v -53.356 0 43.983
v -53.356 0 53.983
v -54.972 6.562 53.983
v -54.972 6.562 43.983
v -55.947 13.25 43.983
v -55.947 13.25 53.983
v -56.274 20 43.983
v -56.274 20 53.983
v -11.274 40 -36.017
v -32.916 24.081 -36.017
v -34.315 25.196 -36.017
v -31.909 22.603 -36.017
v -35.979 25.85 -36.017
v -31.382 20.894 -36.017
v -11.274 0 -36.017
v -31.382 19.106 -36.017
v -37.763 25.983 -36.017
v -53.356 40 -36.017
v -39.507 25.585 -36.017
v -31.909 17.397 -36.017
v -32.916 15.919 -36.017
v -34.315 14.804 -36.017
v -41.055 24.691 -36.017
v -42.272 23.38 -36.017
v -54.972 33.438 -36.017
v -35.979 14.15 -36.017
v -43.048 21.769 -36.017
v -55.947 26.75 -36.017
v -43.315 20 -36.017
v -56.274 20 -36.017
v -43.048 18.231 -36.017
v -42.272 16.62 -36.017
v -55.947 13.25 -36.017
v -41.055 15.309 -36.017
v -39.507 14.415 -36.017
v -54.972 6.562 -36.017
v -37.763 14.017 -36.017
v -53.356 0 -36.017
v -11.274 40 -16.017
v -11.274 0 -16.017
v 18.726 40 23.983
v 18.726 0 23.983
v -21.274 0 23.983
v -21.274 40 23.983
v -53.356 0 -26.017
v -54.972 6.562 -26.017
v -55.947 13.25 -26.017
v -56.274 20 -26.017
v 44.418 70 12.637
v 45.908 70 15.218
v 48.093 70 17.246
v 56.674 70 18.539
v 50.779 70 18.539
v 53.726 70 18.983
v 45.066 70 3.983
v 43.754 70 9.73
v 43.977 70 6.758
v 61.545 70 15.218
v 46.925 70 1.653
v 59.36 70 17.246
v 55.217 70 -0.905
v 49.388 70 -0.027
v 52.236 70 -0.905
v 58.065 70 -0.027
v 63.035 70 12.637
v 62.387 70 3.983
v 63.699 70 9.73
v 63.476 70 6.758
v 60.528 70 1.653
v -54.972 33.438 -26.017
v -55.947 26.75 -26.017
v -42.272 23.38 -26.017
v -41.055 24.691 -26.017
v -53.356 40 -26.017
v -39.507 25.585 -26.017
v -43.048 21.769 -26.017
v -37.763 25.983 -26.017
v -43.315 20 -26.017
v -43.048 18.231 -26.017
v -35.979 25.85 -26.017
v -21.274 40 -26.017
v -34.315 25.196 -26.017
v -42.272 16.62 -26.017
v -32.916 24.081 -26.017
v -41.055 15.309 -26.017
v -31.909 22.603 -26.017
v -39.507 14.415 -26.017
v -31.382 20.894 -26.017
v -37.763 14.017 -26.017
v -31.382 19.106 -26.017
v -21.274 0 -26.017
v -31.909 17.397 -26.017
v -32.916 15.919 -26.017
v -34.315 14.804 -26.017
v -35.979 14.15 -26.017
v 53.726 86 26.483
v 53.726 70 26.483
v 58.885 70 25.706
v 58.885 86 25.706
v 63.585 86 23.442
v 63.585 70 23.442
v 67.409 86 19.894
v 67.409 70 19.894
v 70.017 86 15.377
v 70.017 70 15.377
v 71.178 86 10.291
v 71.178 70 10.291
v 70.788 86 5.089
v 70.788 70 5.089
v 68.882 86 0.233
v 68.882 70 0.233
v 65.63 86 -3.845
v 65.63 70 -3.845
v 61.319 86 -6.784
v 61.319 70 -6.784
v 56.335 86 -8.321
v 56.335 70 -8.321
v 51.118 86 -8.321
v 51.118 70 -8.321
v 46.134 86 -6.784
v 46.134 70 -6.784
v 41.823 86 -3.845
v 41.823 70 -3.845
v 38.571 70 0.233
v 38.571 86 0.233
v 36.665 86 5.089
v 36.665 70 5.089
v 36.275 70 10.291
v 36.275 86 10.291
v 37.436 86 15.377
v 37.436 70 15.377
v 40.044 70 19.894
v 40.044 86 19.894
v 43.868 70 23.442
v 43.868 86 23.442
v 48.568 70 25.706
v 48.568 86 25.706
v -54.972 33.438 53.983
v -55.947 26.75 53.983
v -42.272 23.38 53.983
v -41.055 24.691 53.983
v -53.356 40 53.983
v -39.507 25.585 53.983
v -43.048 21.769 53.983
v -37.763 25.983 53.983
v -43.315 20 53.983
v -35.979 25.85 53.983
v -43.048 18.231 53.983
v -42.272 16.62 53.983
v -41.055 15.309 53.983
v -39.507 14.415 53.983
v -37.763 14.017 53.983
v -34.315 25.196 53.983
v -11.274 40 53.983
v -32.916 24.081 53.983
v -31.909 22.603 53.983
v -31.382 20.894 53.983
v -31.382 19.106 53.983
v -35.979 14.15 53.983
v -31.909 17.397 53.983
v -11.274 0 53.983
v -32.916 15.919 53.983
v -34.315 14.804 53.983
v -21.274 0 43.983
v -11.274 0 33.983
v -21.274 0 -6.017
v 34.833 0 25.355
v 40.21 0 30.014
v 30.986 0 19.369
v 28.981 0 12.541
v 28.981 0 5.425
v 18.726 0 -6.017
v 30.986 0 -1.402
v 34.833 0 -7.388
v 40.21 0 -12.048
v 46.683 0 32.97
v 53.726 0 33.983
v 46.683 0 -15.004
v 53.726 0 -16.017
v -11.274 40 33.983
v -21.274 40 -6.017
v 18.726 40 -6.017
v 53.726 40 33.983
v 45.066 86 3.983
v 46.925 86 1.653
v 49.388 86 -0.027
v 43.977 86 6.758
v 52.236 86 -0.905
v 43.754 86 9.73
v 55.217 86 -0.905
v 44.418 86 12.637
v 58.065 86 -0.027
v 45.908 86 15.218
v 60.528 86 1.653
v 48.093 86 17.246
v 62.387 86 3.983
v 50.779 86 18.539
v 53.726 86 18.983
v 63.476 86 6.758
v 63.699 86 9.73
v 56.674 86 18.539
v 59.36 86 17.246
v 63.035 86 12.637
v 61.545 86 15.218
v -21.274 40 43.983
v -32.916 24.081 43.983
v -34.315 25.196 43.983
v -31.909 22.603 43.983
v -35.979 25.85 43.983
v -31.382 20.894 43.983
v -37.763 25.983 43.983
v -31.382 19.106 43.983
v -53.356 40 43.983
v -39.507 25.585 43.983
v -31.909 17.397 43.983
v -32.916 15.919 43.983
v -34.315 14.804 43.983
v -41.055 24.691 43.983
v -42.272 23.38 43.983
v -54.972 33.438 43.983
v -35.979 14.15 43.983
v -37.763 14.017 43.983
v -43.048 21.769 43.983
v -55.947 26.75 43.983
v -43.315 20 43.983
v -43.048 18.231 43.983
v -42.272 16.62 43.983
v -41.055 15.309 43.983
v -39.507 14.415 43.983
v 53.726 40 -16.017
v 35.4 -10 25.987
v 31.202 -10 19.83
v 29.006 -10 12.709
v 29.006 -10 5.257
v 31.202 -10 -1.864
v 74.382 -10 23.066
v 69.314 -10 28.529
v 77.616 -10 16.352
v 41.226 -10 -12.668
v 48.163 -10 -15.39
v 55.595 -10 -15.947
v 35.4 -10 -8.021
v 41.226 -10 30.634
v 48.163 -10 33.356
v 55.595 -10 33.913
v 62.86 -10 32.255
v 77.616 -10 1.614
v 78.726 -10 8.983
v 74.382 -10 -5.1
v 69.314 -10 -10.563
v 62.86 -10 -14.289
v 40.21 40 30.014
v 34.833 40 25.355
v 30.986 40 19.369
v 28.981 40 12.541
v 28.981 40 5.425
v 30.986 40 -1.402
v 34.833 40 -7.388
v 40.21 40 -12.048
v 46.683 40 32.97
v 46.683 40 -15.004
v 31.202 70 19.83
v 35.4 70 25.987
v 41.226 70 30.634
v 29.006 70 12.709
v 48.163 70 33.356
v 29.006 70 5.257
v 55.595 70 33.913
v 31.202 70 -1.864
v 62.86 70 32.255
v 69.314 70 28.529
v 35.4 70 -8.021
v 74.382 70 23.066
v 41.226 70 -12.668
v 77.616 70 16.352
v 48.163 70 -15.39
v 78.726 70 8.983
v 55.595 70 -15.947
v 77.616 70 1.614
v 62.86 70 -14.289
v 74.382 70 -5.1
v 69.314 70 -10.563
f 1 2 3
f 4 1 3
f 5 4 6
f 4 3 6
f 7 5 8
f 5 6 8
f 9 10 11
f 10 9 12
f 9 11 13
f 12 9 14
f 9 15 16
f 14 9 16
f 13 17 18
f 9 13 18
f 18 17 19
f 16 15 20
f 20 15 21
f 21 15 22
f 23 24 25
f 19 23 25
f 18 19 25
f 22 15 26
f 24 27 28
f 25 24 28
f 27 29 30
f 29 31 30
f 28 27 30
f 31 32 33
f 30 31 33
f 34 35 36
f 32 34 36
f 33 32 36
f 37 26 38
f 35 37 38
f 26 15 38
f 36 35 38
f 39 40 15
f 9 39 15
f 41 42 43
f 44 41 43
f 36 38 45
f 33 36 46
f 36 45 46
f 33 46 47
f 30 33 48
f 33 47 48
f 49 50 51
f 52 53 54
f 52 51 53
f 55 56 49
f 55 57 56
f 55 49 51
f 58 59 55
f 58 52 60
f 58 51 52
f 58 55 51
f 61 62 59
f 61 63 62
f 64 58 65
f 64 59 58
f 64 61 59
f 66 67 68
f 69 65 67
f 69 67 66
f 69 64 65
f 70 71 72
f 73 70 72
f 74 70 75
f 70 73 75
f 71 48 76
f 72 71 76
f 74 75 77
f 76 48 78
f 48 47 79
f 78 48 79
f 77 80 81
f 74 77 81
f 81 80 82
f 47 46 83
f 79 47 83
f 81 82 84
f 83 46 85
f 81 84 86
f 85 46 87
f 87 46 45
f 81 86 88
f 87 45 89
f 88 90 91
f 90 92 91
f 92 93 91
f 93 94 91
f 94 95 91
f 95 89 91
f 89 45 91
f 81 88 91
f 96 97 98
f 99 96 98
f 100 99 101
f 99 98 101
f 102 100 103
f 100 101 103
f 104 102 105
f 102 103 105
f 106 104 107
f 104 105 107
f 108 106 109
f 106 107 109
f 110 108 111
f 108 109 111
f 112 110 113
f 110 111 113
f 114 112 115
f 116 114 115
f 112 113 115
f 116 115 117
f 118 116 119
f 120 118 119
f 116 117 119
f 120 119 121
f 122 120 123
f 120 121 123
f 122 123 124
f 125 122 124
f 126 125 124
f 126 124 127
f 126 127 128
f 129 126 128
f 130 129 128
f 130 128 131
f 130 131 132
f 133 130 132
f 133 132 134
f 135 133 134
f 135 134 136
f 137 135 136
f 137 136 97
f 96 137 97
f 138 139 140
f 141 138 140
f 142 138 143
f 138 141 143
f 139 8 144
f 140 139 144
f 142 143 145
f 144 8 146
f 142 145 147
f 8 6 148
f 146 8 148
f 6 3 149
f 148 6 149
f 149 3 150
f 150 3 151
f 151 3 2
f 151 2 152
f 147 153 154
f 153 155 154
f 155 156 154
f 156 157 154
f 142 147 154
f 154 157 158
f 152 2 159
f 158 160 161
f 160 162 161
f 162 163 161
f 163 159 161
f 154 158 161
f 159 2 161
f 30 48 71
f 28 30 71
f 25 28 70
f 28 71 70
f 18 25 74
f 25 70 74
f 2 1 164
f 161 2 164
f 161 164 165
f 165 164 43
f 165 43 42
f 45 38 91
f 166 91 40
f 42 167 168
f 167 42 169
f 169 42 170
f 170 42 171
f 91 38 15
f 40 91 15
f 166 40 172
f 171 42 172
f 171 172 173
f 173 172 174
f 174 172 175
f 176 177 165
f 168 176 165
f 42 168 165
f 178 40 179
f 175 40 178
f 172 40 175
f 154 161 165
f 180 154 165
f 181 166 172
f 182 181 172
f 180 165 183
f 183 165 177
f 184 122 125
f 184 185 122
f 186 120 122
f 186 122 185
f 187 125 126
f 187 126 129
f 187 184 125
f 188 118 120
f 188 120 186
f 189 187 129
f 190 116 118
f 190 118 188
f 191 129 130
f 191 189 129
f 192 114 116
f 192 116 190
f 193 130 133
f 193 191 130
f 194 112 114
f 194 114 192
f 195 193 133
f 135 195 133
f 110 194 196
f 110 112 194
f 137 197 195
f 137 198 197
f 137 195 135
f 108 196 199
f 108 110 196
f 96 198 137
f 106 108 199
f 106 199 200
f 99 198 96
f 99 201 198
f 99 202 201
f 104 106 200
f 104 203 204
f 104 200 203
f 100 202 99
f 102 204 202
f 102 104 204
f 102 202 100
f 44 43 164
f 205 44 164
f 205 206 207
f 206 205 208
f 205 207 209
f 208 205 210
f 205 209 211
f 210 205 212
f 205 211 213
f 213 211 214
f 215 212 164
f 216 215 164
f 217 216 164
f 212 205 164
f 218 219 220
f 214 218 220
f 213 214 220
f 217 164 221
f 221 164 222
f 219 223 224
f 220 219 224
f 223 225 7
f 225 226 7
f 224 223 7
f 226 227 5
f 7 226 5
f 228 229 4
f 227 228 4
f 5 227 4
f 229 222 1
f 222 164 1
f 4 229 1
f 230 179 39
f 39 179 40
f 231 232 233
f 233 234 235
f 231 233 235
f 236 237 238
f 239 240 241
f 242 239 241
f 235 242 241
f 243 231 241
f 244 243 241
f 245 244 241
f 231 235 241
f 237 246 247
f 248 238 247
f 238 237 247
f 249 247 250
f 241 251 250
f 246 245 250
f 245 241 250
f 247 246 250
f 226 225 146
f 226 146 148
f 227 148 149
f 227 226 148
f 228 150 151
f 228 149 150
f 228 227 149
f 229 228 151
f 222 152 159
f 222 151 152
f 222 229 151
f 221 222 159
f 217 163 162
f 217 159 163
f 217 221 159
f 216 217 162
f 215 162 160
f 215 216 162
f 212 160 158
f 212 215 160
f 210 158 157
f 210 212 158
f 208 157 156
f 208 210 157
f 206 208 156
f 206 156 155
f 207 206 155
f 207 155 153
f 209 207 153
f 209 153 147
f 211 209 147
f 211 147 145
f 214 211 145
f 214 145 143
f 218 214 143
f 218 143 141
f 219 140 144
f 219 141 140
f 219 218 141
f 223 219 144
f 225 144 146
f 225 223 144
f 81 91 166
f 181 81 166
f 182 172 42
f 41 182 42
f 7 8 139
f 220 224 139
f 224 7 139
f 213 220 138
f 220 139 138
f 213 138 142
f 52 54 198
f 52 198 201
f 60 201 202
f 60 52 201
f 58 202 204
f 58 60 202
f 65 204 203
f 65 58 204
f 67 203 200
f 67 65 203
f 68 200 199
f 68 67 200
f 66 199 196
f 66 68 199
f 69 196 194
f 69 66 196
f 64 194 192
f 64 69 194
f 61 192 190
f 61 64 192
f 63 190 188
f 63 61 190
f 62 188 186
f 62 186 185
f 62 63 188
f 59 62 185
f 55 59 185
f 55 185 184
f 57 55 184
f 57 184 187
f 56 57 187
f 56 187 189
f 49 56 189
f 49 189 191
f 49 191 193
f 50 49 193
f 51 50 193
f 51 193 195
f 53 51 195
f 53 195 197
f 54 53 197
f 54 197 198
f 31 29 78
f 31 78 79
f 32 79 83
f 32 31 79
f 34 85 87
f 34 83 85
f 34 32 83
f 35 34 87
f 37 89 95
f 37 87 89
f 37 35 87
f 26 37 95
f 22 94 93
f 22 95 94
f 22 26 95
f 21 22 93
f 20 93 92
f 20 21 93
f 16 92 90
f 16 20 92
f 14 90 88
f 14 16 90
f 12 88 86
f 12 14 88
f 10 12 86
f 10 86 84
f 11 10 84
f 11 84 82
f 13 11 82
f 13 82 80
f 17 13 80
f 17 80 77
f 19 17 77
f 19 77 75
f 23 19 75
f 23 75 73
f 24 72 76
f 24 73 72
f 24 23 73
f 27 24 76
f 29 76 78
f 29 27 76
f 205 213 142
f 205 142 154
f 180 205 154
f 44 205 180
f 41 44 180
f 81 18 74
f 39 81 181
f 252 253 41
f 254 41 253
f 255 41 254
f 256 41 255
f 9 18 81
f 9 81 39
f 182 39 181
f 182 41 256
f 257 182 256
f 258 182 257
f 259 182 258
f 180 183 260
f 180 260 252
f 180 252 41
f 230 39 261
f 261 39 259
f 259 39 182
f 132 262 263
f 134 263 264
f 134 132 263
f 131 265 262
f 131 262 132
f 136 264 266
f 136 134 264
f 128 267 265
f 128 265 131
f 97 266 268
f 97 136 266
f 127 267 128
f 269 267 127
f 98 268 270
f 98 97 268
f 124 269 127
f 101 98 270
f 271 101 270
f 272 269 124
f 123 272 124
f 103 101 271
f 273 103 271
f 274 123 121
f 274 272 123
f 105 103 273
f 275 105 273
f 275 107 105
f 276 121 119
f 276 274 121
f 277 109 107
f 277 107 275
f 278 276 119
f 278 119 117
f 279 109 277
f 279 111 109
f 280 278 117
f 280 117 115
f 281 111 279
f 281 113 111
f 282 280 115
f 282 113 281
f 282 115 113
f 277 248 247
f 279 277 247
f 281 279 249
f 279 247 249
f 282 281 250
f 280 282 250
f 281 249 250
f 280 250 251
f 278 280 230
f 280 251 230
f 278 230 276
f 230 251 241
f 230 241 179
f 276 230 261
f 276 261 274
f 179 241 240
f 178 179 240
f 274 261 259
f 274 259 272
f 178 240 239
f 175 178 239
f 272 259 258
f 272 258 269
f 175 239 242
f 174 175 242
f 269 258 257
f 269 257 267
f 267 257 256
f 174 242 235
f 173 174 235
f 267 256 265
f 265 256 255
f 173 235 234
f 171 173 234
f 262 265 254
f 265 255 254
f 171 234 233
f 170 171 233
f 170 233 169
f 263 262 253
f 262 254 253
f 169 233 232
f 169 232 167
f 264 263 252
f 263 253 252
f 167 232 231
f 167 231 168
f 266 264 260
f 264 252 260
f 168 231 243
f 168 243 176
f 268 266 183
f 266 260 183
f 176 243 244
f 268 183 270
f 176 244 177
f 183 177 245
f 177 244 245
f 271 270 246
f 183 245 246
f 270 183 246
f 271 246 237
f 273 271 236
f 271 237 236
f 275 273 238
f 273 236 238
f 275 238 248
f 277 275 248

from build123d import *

# Parameters (mm, degrees)
BOSS_EXTRUDE1_DEPTH      = 40
CUT_EXTRUDE2_DEPTH       = 90
CUT_EXTRUDE4_DEPTH       = 151
CUT_EXTRUDE4_DEPTH_BACK  = 151
SKETCH3_R                = 6
BOSS_EXTRUDE2_DEPTH      = 30
BOSS_EXTRUDE2_DEPTH_BACK = 50
F_3DSKETCH1_R            = 25
SKETCH5_R                = 17.5
SKETCH5_R_2              = 10
BOSS_EXTRUDE3_DEPTH      = 86


with BuildPart() as part:
    # Sketch1 → Boss-Extrude1 (new body)
    with BuildSketch(Plane(origin=(0, 0, 0), x_dir=(1, 0, 0), z_dir=(0, 1, 0))):
        Polygon((-56.273517373, 36.016865909), (-56.273517373, 26.016865909), (-21.273517373, 26.016865909), (-21.273517373, 6.016865909), (18.726482627, 6.016865909), (18.726482627, -23.983134091), (-21.273517373, -23.983134091), (-21.273517373, -43.983134091), (-56.273517373, -43.983134091), (-56.273517373, -53.983134091), (-11.273517373, -53.983134091), (-11.273517373, -33.983134091), (53.726482627, -33.983134091), (53.726482627, 16.016865909), (-11.273517373, 16.016865909), (-11.273517373, 36.016865909), align=None)
    extrude(amount=BOSS_EXTRUDE1_DEPTH)

    # Sketch2 → Cut-Extrude2 (cut)
    with BuildSketch(Plane.XY.offset(53.983134091)):
        with BuildLine():
            ThreePointArc((-56.273517373, 20), (-55.540185955, 30.10587075), (-53.355556698, 40))
            Line((-53.355556698, 40), (-56.273517373, 40))
            Line((-56.273517373, 40), (-56.273517373, 20))
        make_face()
        with BuildLine():
            ThreePointArc((-53.355556698, 0), (-55.540185955, 9.89412925), (-56.273517373, 20))
            Line((-56.273517373, 20), (-56.273517373, 0))
            Line((-56.273517373, 0), (-53.355556698, 0))
        make_face()
    extrude(amount=-CUT_EXTRUDE2_DEPTH, mode=Mode.SUBTRACT)

    # Sketch3 → Cut-Extrude4 (cut, two sides: drawn at the far end of the back side and taken through both)
    with BuildSketch(Plane.XY.offset(-26.016865909).offset(-CUT_EXTRUDE4_DEPTH_BACK)):
        with Locations((-37.314537036, 20)):
            Circle(SKETCH3_R)
    extrude(amount=CUT_EXTRUDE4_DEPTH + CUT_EXTRUDE4_DEPTH_BACK, mode=Mode.SUBTRACT)

    # 3DSketch1 → Boss-Extrude2 (add, two sides: drawn at the far end of the back side and taken through both)
    with BuildSketch(Plane(origin=(53.726482627, 40, 8.983134091), x_dir=(0, 0, 1), z_dir=(0, 1, 0)).offset(-BOSS_EXTRUDE2_DEPTH_BACK)):
        Circle(F_3DSKETCH1_R)
    extrude(amount=BOSS_EXTRUDE2_DEPTH + BOSS_EXTRUDE2_DEPTH_BACK)

    # Sketch5 → Boss-Extrude3 (add)
    with BuildSketch(Plane(origin=(0, 0, 0), x_dir=(1, 0, 0), z_dir=(0, 1, 0))):
        with Locations((53.726482627, -8.983134091)):
            Circle(SKETCH5_R)
        with Locations((53.726482627, -8.983134091)):
            Circle(SKETCH5_R_2, mode=Mode.SUBTRACT)
    extrude(amount=BOSS_EXTRUDE3_DEPTH)


solid = part.part
